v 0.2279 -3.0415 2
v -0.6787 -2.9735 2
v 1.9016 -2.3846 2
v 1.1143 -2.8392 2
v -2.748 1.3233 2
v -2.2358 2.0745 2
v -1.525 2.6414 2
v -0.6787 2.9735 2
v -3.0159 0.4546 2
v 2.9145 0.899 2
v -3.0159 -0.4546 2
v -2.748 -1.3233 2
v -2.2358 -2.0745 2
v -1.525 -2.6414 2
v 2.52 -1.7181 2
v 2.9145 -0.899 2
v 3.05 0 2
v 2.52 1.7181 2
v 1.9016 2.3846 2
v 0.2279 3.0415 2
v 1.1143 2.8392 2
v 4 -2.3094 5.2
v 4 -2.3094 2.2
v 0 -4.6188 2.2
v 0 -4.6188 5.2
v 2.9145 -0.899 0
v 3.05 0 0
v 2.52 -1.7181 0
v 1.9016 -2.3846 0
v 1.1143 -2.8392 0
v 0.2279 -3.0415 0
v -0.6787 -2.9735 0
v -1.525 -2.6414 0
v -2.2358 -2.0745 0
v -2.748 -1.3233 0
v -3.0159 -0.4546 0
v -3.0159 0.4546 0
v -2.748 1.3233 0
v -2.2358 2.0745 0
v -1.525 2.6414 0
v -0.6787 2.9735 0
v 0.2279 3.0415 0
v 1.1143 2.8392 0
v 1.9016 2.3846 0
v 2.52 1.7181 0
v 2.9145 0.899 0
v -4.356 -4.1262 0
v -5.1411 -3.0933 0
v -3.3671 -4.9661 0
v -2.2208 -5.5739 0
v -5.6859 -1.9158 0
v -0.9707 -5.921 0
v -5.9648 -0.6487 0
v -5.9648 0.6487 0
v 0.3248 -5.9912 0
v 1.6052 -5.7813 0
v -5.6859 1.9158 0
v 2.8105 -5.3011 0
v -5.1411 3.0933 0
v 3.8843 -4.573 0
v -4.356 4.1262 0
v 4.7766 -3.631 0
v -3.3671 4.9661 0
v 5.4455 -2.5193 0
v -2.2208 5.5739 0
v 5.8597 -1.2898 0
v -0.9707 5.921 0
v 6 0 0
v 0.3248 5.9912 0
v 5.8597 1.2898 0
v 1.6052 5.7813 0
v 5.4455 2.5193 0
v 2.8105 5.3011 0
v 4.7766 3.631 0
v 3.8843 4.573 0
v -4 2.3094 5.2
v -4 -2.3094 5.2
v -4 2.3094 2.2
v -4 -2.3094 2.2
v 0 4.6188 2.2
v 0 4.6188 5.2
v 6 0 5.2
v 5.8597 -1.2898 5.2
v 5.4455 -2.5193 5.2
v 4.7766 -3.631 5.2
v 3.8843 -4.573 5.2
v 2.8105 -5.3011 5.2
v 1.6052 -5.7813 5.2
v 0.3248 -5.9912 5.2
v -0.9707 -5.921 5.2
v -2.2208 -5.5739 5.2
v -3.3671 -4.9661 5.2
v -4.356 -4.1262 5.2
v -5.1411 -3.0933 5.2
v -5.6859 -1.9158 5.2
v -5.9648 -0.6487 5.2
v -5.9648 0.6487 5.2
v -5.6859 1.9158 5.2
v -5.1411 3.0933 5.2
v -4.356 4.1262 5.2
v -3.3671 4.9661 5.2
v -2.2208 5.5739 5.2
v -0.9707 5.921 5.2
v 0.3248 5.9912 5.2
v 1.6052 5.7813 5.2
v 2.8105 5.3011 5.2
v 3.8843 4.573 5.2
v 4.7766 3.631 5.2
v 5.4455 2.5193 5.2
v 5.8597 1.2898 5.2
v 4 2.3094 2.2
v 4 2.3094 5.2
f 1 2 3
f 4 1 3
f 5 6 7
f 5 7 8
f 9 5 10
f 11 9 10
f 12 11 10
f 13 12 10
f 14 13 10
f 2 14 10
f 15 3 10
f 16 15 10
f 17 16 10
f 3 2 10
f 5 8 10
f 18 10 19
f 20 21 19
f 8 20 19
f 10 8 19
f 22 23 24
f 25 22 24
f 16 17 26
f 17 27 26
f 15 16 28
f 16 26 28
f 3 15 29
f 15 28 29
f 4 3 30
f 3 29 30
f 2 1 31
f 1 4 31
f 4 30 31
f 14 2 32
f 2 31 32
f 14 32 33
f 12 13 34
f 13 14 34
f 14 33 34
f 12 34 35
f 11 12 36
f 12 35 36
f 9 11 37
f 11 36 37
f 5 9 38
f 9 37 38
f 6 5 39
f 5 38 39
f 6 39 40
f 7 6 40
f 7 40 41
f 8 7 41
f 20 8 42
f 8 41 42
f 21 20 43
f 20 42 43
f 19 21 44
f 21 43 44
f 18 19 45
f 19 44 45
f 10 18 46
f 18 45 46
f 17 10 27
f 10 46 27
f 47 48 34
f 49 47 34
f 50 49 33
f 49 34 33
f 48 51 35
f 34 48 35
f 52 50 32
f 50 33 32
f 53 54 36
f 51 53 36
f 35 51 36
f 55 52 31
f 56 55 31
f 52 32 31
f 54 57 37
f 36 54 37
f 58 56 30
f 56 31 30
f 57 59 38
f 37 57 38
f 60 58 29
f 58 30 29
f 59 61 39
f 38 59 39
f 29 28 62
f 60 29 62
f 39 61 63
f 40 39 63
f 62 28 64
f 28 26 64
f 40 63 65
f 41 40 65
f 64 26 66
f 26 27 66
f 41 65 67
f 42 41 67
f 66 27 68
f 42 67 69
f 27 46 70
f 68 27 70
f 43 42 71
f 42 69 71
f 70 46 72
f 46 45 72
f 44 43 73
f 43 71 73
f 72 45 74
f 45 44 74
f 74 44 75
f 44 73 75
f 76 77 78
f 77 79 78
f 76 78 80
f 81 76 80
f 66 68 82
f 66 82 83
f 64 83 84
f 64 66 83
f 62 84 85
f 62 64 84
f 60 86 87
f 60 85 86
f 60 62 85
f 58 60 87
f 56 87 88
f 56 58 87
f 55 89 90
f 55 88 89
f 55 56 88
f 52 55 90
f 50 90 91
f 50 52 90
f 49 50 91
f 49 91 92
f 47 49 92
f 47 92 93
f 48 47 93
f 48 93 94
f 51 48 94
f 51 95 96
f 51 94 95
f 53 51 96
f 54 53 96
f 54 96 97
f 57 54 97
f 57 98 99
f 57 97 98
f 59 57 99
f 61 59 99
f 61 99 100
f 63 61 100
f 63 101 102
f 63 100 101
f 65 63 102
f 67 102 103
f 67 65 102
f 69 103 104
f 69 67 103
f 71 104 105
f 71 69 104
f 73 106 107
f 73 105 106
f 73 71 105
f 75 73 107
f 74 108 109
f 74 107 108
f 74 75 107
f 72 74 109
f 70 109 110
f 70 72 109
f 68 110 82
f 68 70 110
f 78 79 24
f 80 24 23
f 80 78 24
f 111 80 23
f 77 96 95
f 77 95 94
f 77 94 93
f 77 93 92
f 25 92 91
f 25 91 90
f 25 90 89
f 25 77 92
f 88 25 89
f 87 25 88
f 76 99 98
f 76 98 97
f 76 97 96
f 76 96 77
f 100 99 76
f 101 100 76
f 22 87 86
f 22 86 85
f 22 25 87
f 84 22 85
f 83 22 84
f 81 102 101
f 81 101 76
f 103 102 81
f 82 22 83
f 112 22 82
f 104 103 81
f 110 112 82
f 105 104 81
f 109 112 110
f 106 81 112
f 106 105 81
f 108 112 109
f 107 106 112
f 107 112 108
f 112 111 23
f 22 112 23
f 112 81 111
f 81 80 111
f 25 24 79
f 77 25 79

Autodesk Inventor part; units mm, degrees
ref_plane "YZ Plane" through (0, 0, 0) normal (1, 0, 0) x (0, 1, 0)
ref_plane "XZ Plane" through (0, 0, 0) normal (0, 1, 0) x (-1, 0, 0)
ref_plane "XY Plane" through (0, 0, 0) normal (0, 0, 1) x (1, 0, 0)
sketch "Skizze1" plane through (0, 0, 0) normal (0, 0, 1) x (1, 0, 0)
  circle A0 centre (0, 0) radius 6
  circle A1 centre (0, 0) radius 3.05
  dimension "d0" = 6.1
  dimension "d1" = 12
extrude "Extrusion1" add sketch "Skizze1" along normal blind 2
sketch "Skizze2" plane through (0, 0, 2) normal (0, 0, 1) x (1, 0, 0)
  circle A0 centre (0, 0) radius 6 projected
extrude "Extrusion2" add sketch "Skizze2" along normal blind 0.2
sketch "Skizze3" plane through (0, 0, 2.2) normal (0, 0, 1) x (1, 0, 0)
  circle A0 centre (0, 0) radius 6 projected
  line L0 (0, 4.6188) -> (4, 2.3094)
  line L1 (4, 2.3094) -> (4, -2.3094)
  line L2 (4, -2.3094) -> (0, -4.6188)
  line L3 (0, -4.6188) -> (-4, -2.3094)
  line L4 (-4, -2.3094) -> (-4, 2.3094)
  line L5 (-4, 2.3094) -> (0, 4.6188)
  dimension "d6" = 8
extrude "Extrusion3" add sketch "Skizze3" along normal blind 3
properties part number "M5_encoderMagnet" material "ABS-Kunststoff - Schwarz"
